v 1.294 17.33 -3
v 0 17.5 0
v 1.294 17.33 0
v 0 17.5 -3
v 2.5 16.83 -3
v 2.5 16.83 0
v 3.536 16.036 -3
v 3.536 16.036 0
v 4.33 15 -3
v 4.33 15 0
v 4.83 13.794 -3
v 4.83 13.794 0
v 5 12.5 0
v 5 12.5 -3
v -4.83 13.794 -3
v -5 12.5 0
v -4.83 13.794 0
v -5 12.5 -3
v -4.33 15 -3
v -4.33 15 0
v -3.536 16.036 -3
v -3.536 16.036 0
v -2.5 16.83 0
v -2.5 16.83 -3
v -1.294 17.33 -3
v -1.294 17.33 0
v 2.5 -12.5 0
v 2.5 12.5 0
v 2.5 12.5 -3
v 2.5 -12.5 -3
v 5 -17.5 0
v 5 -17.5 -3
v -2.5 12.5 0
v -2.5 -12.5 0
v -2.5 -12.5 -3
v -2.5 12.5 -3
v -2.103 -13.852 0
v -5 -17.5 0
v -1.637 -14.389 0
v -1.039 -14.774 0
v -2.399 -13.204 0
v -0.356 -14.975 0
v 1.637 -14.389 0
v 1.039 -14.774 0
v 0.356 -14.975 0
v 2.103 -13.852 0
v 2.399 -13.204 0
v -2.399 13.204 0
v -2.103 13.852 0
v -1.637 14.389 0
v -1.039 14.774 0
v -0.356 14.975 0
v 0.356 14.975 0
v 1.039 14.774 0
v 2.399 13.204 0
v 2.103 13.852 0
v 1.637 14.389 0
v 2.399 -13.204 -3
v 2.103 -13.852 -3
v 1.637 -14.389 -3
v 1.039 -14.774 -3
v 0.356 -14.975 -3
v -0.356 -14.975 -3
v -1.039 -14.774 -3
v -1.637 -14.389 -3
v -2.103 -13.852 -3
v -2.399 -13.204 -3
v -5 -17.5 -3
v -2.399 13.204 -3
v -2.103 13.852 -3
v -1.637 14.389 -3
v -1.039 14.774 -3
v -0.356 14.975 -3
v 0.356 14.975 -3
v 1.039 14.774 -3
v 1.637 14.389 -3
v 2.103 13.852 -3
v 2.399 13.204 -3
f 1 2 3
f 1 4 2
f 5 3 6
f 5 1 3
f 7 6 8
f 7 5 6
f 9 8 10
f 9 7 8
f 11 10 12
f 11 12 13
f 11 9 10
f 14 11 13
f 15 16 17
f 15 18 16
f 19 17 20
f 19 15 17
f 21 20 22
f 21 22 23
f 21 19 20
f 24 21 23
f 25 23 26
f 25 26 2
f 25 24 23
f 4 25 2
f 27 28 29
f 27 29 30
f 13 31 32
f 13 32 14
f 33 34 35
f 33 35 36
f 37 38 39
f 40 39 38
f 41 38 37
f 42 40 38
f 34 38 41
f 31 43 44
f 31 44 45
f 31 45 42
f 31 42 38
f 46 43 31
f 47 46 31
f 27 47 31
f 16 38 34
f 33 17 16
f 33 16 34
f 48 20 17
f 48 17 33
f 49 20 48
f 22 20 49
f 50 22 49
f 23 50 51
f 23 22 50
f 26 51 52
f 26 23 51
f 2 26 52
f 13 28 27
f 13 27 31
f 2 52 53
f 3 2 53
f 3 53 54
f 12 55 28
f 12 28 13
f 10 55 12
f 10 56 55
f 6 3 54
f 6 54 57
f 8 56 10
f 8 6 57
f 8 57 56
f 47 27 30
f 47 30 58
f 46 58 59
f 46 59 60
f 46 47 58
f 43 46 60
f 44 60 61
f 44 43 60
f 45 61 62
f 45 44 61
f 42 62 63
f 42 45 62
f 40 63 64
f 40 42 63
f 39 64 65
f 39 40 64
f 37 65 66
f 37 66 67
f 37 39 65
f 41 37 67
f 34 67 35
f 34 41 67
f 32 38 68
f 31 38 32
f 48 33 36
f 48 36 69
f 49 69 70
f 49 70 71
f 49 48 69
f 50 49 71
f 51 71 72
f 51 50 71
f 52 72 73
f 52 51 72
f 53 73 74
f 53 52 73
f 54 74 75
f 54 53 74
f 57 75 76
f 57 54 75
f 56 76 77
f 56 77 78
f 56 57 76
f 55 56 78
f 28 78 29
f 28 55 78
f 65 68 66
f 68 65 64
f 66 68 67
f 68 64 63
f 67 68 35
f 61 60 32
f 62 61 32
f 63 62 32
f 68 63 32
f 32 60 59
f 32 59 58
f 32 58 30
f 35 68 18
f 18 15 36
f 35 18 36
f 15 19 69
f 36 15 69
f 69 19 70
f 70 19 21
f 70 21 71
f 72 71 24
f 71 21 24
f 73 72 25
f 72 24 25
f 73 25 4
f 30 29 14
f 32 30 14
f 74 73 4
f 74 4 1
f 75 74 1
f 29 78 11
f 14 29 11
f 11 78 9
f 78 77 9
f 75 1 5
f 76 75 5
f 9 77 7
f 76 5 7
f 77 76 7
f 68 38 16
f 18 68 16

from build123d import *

# Parameters (mm, degrees)
SKETCH1_W          = 10
SKETCH1_H          = 35
BASE_FLANGE1_DEPTH = 3
FILLET1_R          = 5


# Sheet-metal steps are written as plain solids
with BuildPart() as part:
    # Sketch1 → Base-Flange1 (new body)
    with BuildSketch(Plane.XY):
        Rectangle(SKETCH1_W, SKETCH1_H)
        with BuildLine():
            Line((-2.5, -12.5), (-2.5, 12.5))
            ThreePointArc((-2.5, 12.5), (0, 15), (2.5, 12.5))
            Line((2.5, 12.5), (2.5, -12.5))
            ThreePointArc((2.5, -12.5), (0, -15), (-2.5, -12.5))
        make_face(mode=Mode.SUBTRACT)
    extrude(amount=-BASE_FLANGE1_DEPTH)

    # Fillet1
    fillet1_edges = [part.edges().sort_by_distance(p)[0] for p in [
        (-5, 17.5, -1.5),
        (5, 17.5, -1.5),
    ]]
    fillet(fillet1_edges, radius=FILLET1_R - 0.0001)  # a hair under: the kernel refuses the full size


solid = part.part
